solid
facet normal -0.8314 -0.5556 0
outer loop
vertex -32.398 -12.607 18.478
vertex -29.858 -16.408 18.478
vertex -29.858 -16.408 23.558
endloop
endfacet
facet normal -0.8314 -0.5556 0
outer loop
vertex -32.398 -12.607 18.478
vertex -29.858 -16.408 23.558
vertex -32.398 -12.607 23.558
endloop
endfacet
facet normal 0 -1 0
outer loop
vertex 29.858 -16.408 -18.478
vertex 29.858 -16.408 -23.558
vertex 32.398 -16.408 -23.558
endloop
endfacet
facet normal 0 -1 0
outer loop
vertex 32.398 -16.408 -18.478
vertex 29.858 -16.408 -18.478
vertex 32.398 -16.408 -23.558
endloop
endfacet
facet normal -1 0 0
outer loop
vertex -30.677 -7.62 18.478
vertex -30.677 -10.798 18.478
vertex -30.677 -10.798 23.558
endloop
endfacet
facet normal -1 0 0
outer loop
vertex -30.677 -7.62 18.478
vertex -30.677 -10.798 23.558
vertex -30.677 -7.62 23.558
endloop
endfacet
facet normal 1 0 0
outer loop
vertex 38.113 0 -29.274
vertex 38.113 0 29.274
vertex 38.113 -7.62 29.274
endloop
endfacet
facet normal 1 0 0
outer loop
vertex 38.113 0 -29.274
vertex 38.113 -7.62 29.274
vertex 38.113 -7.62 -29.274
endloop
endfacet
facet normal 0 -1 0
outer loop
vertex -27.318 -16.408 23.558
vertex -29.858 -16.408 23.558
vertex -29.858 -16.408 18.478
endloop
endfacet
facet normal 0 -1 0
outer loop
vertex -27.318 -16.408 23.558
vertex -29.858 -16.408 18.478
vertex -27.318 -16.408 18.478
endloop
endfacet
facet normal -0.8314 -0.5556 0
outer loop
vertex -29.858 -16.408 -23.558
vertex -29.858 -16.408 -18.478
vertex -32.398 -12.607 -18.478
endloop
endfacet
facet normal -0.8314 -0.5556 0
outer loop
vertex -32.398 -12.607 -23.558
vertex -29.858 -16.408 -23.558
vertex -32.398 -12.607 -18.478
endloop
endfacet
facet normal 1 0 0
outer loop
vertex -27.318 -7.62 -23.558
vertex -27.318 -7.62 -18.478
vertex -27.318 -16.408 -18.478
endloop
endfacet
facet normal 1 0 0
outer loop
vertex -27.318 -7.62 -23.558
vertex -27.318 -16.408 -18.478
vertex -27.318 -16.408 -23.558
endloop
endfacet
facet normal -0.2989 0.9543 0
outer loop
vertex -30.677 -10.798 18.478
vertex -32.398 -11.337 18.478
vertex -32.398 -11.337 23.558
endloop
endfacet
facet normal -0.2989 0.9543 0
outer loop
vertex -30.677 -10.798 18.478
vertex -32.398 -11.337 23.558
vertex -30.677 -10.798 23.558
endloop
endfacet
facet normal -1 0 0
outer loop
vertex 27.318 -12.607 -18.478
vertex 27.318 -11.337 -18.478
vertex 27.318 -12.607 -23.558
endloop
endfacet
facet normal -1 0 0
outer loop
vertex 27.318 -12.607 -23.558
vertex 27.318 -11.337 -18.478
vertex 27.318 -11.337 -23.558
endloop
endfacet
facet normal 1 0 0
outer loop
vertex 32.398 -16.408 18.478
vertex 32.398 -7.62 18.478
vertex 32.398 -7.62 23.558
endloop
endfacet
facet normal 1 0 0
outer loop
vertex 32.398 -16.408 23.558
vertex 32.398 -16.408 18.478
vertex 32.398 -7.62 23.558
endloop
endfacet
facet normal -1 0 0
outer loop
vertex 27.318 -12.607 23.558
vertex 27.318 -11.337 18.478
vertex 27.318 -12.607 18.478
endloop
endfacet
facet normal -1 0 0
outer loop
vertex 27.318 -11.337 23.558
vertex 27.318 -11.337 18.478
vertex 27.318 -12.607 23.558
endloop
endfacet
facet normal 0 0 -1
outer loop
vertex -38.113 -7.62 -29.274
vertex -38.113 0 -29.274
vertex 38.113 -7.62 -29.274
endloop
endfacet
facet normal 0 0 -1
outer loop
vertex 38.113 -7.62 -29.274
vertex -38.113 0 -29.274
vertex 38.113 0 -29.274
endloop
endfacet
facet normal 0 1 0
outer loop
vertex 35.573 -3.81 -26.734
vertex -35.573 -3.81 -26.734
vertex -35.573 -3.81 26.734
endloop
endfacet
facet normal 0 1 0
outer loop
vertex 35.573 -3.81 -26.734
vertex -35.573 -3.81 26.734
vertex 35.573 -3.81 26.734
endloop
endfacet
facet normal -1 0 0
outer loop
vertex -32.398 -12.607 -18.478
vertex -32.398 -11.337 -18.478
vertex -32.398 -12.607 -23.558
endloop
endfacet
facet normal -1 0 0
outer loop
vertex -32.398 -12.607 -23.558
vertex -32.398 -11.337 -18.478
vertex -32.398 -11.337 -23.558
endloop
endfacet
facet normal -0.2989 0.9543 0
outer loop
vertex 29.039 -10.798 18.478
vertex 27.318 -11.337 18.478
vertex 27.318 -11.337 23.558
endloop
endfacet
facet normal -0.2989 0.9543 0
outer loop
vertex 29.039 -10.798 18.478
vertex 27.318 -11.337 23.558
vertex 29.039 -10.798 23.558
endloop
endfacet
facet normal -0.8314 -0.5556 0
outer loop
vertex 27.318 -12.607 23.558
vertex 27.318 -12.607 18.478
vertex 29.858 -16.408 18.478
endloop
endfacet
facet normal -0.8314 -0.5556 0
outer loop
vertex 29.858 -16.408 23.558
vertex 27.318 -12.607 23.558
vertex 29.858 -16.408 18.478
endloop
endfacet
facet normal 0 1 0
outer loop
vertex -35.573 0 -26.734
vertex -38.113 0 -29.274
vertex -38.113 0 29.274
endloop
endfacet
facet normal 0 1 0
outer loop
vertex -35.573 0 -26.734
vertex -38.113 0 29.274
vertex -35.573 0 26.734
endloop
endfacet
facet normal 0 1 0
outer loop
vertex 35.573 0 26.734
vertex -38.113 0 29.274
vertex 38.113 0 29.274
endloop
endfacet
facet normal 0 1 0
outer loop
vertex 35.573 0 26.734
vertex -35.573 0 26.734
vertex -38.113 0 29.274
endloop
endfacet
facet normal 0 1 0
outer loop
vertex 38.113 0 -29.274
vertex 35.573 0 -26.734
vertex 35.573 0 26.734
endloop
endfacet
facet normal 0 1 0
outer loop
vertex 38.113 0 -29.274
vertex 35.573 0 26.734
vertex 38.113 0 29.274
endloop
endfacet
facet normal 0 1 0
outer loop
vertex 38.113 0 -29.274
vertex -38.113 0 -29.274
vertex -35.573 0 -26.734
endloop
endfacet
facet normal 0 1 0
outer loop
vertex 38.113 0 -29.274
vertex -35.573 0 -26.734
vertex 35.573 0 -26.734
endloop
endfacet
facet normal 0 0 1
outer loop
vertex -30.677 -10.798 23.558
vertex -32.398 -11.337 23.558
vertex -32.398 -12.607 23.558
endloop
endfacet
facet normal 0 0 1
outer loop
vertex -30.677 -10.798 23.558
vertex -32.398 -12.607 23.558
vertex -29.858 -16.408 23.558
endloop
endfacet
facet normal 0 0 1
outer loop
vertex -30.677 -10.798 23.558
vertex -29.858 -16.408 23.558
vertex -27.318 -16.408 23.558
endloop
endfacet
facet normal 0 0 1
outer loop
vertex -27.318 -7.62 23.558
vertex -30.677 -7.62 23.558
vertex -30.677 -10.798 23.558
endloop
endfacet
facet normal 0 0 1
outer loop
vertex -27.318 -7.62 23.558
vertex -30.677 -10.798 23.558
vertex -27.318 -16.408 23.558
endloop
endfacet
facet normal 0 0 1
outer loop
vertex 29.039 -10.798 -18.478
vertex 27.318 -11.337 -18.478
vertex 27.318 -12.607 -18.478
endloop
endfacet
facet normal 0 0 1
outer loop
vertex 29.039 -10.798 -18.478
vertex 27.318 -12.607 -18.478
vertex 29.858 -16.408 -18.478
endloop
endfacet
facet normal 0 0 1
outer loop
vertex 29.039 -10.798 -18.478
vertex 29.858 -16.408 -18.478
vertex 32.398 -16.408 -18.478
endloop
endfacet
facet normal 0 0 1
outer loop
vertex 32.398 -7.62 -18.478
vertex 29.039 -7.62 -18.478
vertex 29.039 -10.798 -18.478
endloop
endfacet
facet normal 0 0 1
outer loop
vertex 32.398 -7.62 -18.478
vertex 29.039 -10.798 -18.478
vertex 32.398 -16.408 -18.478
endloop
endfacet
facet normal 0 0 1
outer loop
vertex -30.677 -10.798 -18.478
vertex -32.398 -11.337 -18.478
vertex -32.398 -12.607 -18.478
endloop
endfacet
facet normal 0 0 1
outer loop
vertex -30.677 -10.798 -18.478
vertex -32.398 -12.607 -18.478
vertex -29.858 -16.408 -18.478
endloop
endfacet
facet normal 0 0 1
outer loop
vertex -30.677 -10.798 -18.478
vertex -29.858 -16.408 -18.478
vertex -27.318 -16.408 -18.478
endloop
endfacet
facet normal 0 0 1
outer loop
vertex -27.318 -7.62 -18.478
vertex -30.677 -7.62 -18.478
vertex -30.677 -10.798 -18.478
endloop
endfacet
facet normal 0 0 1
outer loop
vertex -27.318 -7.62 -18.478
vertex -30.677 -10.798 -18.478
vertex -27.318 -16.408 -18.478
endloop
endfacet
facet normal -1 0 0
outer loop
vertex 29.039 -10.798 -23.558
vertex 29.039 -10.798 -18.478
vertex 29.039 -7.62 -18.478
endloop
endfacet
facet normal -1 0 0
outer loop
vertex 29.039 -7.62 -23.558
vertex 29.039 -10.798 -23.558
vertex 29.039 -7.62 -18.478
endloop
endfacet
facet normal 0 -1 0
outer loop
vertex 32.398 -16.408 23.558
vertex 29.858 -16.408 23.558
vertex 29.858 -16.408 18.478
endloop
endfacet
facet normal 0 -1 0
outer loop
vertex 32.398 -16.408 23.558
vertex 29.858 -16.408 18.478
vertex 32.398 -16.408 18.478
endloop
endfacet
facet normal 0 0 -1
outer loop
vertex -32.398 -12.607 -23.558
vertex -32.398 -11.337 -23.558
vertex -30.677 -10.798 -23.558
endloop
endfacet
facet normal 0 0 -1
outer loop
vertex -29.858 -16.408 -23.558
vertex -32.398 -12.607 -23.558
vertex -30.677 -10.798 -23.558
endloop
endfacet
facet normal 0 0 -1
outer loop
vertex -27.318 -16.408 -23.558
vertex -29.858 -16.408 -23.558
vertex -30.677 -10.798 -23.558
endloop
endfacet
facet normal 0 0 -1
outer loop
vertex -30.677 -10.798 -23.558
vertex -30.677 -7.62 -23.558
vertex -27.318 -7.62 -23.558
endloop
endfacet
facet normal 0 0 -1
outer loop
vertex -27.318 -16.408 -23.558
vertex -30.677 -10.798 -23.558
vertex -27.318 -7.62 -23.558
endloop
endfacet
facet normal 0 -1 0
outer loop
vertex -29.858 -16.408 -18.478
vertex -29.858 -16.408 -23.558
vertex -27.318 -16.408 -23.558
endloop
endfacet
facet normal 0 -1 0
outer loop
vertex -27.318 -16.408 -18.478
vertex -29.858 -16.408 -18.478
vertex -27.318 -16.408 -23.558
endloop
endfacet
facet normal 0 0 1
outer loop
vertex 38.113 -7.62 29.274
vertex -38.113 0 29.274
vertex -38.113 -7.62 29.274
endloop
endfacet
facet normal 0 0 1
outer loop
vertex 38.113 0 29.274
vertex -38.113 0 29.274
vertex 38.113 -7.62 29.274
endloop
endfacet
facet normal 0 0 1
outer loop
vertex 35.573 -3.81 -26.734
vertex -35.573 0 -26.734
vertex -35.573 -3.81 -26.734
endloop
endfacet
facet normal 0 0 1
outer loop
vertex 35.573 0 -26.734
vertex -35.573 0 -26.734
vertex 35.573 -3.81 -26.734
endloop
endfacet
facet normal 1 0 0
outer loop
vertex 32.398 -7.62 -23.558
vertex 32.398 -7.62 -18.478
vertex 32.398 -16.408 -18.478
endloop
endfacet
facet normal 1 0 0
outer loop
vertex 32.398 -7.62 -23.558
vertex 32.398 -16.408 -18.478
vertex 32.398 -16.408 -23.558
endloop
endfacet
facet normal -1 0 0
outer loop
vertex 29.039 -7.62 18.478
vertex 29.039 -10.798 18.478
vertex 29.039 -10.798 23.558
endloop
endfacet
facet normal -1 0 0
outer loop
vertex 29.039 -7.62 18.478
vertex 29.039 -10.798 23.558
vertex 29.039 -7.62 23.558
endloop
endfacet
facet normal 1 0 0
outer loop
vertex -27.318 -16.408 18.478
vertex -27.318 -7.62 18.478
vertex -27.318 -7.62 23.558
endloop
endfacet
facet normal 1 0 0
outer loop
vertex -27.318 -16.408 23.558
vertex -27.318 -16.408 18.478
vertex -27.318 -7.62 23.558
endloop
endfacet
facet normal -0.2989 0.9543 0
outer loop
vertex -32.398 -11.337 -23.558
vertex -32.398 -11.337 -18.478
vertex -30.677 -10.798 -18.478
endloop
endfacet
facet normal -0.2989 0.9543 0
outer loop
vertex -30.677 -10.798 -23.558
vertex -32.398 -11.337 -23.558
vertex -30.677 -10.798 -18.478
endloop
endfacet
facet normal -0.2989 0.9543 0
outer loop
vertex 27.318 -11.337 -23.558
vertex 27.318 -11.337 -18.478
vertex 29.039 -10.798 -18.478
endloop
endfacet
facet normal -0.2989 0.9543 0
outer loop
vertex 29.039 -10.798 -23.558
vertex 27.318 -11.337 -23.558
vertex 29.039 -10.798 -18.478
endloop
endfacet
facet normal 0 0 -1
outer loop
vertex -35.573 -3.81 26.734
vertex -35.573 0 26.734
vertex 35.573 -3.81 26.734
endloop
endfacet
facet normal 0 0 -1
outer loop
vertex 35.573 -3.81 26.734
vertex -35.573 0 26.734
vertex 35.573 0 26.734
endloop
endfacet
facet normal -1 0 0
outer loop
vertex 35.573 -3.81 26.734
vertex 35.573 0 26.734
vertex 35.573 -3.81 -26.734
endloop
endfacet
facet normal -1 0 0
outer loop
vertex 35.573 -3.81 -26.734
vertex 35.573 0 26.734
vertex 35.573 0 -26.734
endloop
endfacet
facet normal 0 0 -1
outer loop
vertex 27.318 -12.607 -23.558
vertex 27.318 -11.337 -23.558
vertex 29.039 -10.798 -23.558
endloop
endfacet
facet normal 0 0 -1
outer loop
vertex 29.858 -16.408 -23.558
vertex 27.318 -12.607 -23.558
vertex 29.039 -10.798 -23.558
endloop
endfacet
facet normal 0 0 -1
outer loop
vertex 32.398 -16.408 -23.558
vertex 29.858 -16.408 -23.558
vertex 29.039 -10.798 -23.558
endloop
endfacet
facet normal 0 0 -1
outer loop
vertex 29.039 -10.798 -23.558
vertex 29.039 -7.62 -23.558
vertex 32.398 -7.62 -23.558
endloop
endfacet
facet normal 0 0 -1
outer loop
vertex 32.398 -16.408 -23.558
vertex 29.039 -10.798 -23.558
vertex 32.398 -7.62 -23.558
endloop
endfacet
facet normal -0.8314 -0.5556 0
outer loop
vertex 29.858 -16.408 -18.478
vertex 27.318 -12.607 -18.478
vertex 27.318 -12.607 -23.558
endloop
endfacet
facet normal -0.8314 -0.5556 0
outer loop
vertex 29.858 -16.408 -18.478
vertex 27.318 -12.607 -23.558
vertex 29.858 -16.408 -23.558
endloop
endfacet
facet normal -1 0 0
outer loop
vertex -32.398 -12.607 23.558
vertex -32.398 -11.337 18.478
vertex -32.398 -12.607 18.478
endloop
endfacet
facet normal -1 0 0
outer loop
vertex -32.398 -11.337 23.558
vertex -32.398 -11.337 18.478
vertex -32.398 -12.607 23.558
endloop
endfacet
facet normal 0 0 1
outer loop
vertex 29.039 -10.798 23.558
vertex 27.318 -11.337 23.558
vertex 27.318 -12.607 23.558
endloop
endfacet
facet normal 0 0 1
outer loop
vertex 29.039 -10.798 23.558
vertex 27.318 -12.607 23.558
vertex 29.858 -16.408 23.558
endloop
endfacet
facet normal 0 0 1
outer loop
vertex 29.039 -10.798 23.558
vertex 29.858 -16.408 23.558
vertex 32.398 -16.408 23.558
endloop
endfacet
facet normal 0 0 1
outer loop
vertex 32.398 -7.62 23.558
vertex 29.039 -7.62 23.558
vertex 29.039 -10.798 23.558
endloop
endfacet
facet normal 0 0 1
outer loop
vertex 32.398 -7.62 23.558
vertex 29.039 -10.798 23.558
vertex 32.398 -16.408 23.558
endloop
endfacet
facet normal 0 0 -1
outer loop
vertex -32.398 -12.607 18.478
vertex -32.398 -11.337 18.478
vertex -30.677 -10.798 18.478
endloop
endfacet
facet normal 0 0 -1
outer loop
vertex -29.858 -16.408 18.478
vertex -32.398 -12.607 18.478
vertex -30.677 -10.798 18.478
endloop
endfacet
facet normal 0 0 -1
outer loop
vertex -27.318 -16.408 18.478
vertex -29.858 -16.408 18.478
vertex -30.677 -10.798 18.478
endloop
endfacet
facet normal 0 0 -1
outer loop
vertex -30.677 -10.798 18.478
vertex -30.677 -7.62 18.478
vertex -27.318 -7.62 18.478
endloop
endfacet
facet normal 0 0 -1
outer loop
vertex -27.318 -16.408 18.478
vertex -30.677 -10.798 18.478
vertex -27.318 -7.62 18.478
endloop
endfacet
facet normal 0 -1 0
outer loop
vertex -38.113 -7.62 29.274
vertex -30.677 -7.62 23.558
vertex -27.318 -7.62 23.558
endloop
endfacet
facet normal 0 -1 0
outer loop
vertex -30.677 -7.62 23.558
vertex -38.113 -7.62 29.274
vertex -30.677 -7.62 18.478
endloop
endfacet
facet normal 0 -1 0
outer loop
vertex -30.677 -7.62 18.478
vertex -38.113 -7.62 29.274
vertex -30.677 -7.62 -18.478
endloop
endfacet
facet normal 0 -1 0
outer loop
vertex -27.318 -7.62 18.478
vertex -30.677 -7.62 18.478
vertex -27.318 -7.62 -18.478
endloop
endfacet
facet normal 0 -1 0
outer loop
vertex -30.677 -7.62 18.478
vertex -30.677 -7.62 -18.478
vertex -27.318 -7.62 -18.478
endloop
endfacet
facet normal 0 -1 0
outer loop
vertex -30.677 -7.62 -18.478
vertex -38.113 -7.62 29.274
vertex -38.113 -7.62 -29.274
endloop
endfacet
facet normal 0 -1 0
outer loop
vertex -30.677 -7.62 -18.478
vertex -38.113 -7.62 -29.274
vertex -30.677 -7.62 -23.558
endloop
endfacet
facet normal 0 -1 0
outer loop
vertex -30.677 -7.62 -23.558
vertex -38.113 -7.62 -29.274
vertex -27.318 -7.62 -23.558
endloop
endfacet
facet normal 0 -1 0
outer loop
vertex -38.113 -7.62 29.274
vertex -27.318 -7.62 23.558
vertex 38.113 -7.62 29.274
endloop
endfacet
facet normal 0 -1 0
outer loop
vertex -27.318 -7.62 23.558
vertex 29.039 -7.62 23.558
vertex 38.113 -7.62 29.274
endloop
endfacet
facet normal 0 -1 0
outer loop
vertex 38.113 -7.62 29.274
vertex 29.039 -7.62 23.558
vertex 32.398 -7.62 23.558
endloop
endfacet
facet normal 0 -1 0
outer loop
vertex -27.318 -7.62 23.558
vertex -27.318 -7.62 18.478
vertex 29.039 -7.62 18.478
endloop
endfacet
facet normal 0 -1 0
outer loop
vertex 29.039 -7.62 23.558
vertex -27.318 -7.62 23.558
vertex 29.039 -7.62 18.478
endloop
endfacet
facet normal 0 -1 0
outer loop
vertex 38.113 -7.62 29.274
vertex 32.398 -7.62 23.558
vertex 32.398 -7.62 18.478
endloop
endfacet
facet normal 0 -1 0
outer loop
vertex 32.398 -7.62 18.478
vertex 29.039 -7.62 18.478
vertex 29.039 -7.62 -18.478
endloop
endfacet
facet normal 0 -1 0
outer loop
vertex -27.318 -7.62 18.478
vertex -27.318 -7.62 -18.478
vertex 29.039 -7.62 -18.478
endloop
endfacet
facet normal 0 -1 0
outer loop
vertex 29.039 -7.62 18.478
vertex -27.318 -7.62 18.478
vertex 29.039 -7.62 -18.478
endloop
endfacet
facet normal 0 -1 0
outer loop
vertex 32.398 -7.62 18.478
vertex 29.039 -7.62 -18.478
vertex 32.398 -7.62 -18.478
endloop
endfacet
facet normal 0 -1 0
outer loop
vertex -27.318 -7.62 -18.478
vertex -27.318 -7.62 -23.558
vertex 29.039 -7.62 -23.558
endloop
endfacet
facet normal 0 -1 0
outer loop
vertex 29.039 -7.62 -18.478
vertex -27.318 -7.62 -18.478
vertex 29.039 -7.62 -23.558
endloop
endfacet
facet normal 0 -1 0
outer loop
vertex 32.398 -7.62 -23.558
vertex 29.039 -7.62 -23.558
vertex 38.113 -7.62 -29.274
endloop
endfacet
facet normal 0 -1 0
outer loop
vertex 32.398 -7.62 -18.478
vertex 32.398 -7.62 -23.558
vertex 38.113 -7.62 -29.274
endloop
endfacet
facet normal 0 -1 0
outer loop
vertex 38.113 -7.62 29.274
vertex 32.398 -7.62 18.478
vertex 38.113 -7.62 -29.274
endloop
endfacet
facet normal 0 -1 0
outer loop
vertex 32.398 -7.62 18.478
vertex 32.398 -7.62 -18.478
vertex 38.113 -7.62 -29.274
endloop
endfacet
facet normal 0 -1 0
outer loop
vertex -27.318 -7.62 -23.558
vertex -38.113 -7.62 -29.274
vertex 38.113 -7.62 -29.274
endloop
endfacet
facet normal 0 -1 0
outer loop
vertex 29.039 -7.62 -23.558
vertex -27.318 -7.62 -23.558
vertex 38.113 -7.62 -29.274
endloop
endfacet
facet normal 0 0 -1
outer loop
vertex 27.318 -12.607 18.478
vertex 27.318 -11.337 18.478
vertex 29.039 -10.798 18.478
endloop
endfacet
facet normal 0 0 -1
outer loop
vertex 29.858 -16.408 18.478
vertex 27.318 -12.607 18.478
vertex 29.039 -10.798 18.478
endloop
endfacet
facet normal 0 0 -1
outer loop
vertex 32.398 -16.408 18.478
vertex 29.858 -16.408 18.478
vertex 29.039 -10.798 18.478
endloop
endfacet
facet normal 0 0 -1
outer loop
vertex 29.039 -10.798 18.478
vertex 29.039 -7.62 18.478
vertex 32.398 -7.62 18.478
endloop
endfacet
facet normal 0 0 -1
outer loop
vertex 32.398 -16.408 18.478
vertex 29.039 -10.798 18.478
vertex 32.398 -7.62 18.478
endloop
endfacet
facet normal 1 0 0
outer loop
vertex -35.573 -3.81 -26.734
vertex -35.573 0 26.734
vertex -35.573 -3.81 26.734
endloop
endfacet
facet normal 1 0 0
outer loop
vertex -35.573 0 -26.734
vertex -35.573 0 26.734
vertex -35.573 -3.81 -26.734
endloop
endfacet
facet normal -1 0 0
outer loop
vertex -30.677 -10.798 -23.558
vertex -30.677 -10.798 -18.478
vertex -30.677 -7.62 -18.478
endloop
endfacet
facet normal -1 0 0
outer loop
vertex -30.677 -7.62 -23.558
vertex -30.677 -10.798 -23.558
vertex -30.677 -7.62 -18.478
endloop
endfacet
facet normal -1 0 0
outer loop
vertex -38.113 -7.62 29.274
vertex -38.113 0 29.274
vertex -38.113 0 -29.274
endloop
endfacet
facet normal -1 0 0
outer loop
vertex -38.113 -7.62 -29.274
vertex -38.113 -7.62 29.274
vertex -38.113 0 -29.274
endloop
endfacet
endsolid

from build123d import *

# Parameters (mm, degrees)
SKETCH2_W           = 76.2254
SKETCH2_H           = 58.547
BOSS_EXTRUDE1_DEPTH = 7.62
SKETCH3_W           = 71.1454
SKETCH3_H           = 53.467
CUT_EXTRUDE2_DEPTH  = 3.81
SKETCH4_W           = 5.08
SKETCH4_H           = 5.08
BOSS_EXTRUDE2_DEPTH = 8.7884
CUT_EXTRUDE3_DEPTH  = 5.08


with BuildPart() as part:
    # Sketch2 → Boss-Extrude1 (new body)
    with BuildSketch(Plane(origin=(0, 0, 0), x_dir=(1, 0, 0), z_dir=(0, 1, 0))):
        Rectangle(SKETCH2_W, SKETCH2_H)
    extrude(amount=-BOSS_EXTRUDE1_DEPTH)

    # Sketch3 → Cut-Extrude2 (cut)
    with BuildSketch(Plane(origin=(0, 0, 0), x_dir=(1, 0, 0), z_dir=(0, 1, 0))):
        Rectangle(SKETCH3_W, SKETCH3_H)
    extrude(amount=-CUT_EXTRUDE2_DEPTH, mode=Mode.SUBTRACT)

    # Sketch4 → Boss-Extrude2 (add)
    with BuildSketch(Plane.XZ.offset(7.62)):
        with Locations((-29.8577, 21.0185)):
            Rectangle(SKETCH4_W, SKETCH4_H)
        with Locations((29.8577, 21.0185)):
            Rectangle(SKETCH4_W, SKETCH4_H)
    boss_extrude2 = extrude(amount=BOSS_EXTRUDE2_DEPTH)

    # Sketch5 → Cut-Extrude3 (cut)
    with BuildSketch(Plane.XY.offset(23.5585)):
        Polygon((29.8577, -16.4084), (27.3177, -16.4084), (27.3177, -12.606876095), align=None)
        Polygon((-29.8577, -16.4084), (-32.3977, -12.606876095), (-32.3977, -16.4084), align=None)
        Polygon((27.3177, -7.62), (27.3177, -11.336876095), (29.038774553, -10.798216701), (29.038774553, -7.62), align=None)
        Polygon((-32.3977, -11.336876095), (-30.676625447, -10.798216701), (-30.676625447, -7.62), (-32.3977, -7.62), align=None)
    cut_extrude3 = extrude(amount=-CUT_EXTRUDE3_DEPTH, mode=Mode.SUBTRACT)

    # Mirror1: Boss-Extrude2, Cut-Extrude3 across plane
    add(boss_extrude2.mirror(Plane.XY))
    add(cut_extrude3.mirror(Plane.XY), mode=Mode.SUBTRACT)


solid = part.part
